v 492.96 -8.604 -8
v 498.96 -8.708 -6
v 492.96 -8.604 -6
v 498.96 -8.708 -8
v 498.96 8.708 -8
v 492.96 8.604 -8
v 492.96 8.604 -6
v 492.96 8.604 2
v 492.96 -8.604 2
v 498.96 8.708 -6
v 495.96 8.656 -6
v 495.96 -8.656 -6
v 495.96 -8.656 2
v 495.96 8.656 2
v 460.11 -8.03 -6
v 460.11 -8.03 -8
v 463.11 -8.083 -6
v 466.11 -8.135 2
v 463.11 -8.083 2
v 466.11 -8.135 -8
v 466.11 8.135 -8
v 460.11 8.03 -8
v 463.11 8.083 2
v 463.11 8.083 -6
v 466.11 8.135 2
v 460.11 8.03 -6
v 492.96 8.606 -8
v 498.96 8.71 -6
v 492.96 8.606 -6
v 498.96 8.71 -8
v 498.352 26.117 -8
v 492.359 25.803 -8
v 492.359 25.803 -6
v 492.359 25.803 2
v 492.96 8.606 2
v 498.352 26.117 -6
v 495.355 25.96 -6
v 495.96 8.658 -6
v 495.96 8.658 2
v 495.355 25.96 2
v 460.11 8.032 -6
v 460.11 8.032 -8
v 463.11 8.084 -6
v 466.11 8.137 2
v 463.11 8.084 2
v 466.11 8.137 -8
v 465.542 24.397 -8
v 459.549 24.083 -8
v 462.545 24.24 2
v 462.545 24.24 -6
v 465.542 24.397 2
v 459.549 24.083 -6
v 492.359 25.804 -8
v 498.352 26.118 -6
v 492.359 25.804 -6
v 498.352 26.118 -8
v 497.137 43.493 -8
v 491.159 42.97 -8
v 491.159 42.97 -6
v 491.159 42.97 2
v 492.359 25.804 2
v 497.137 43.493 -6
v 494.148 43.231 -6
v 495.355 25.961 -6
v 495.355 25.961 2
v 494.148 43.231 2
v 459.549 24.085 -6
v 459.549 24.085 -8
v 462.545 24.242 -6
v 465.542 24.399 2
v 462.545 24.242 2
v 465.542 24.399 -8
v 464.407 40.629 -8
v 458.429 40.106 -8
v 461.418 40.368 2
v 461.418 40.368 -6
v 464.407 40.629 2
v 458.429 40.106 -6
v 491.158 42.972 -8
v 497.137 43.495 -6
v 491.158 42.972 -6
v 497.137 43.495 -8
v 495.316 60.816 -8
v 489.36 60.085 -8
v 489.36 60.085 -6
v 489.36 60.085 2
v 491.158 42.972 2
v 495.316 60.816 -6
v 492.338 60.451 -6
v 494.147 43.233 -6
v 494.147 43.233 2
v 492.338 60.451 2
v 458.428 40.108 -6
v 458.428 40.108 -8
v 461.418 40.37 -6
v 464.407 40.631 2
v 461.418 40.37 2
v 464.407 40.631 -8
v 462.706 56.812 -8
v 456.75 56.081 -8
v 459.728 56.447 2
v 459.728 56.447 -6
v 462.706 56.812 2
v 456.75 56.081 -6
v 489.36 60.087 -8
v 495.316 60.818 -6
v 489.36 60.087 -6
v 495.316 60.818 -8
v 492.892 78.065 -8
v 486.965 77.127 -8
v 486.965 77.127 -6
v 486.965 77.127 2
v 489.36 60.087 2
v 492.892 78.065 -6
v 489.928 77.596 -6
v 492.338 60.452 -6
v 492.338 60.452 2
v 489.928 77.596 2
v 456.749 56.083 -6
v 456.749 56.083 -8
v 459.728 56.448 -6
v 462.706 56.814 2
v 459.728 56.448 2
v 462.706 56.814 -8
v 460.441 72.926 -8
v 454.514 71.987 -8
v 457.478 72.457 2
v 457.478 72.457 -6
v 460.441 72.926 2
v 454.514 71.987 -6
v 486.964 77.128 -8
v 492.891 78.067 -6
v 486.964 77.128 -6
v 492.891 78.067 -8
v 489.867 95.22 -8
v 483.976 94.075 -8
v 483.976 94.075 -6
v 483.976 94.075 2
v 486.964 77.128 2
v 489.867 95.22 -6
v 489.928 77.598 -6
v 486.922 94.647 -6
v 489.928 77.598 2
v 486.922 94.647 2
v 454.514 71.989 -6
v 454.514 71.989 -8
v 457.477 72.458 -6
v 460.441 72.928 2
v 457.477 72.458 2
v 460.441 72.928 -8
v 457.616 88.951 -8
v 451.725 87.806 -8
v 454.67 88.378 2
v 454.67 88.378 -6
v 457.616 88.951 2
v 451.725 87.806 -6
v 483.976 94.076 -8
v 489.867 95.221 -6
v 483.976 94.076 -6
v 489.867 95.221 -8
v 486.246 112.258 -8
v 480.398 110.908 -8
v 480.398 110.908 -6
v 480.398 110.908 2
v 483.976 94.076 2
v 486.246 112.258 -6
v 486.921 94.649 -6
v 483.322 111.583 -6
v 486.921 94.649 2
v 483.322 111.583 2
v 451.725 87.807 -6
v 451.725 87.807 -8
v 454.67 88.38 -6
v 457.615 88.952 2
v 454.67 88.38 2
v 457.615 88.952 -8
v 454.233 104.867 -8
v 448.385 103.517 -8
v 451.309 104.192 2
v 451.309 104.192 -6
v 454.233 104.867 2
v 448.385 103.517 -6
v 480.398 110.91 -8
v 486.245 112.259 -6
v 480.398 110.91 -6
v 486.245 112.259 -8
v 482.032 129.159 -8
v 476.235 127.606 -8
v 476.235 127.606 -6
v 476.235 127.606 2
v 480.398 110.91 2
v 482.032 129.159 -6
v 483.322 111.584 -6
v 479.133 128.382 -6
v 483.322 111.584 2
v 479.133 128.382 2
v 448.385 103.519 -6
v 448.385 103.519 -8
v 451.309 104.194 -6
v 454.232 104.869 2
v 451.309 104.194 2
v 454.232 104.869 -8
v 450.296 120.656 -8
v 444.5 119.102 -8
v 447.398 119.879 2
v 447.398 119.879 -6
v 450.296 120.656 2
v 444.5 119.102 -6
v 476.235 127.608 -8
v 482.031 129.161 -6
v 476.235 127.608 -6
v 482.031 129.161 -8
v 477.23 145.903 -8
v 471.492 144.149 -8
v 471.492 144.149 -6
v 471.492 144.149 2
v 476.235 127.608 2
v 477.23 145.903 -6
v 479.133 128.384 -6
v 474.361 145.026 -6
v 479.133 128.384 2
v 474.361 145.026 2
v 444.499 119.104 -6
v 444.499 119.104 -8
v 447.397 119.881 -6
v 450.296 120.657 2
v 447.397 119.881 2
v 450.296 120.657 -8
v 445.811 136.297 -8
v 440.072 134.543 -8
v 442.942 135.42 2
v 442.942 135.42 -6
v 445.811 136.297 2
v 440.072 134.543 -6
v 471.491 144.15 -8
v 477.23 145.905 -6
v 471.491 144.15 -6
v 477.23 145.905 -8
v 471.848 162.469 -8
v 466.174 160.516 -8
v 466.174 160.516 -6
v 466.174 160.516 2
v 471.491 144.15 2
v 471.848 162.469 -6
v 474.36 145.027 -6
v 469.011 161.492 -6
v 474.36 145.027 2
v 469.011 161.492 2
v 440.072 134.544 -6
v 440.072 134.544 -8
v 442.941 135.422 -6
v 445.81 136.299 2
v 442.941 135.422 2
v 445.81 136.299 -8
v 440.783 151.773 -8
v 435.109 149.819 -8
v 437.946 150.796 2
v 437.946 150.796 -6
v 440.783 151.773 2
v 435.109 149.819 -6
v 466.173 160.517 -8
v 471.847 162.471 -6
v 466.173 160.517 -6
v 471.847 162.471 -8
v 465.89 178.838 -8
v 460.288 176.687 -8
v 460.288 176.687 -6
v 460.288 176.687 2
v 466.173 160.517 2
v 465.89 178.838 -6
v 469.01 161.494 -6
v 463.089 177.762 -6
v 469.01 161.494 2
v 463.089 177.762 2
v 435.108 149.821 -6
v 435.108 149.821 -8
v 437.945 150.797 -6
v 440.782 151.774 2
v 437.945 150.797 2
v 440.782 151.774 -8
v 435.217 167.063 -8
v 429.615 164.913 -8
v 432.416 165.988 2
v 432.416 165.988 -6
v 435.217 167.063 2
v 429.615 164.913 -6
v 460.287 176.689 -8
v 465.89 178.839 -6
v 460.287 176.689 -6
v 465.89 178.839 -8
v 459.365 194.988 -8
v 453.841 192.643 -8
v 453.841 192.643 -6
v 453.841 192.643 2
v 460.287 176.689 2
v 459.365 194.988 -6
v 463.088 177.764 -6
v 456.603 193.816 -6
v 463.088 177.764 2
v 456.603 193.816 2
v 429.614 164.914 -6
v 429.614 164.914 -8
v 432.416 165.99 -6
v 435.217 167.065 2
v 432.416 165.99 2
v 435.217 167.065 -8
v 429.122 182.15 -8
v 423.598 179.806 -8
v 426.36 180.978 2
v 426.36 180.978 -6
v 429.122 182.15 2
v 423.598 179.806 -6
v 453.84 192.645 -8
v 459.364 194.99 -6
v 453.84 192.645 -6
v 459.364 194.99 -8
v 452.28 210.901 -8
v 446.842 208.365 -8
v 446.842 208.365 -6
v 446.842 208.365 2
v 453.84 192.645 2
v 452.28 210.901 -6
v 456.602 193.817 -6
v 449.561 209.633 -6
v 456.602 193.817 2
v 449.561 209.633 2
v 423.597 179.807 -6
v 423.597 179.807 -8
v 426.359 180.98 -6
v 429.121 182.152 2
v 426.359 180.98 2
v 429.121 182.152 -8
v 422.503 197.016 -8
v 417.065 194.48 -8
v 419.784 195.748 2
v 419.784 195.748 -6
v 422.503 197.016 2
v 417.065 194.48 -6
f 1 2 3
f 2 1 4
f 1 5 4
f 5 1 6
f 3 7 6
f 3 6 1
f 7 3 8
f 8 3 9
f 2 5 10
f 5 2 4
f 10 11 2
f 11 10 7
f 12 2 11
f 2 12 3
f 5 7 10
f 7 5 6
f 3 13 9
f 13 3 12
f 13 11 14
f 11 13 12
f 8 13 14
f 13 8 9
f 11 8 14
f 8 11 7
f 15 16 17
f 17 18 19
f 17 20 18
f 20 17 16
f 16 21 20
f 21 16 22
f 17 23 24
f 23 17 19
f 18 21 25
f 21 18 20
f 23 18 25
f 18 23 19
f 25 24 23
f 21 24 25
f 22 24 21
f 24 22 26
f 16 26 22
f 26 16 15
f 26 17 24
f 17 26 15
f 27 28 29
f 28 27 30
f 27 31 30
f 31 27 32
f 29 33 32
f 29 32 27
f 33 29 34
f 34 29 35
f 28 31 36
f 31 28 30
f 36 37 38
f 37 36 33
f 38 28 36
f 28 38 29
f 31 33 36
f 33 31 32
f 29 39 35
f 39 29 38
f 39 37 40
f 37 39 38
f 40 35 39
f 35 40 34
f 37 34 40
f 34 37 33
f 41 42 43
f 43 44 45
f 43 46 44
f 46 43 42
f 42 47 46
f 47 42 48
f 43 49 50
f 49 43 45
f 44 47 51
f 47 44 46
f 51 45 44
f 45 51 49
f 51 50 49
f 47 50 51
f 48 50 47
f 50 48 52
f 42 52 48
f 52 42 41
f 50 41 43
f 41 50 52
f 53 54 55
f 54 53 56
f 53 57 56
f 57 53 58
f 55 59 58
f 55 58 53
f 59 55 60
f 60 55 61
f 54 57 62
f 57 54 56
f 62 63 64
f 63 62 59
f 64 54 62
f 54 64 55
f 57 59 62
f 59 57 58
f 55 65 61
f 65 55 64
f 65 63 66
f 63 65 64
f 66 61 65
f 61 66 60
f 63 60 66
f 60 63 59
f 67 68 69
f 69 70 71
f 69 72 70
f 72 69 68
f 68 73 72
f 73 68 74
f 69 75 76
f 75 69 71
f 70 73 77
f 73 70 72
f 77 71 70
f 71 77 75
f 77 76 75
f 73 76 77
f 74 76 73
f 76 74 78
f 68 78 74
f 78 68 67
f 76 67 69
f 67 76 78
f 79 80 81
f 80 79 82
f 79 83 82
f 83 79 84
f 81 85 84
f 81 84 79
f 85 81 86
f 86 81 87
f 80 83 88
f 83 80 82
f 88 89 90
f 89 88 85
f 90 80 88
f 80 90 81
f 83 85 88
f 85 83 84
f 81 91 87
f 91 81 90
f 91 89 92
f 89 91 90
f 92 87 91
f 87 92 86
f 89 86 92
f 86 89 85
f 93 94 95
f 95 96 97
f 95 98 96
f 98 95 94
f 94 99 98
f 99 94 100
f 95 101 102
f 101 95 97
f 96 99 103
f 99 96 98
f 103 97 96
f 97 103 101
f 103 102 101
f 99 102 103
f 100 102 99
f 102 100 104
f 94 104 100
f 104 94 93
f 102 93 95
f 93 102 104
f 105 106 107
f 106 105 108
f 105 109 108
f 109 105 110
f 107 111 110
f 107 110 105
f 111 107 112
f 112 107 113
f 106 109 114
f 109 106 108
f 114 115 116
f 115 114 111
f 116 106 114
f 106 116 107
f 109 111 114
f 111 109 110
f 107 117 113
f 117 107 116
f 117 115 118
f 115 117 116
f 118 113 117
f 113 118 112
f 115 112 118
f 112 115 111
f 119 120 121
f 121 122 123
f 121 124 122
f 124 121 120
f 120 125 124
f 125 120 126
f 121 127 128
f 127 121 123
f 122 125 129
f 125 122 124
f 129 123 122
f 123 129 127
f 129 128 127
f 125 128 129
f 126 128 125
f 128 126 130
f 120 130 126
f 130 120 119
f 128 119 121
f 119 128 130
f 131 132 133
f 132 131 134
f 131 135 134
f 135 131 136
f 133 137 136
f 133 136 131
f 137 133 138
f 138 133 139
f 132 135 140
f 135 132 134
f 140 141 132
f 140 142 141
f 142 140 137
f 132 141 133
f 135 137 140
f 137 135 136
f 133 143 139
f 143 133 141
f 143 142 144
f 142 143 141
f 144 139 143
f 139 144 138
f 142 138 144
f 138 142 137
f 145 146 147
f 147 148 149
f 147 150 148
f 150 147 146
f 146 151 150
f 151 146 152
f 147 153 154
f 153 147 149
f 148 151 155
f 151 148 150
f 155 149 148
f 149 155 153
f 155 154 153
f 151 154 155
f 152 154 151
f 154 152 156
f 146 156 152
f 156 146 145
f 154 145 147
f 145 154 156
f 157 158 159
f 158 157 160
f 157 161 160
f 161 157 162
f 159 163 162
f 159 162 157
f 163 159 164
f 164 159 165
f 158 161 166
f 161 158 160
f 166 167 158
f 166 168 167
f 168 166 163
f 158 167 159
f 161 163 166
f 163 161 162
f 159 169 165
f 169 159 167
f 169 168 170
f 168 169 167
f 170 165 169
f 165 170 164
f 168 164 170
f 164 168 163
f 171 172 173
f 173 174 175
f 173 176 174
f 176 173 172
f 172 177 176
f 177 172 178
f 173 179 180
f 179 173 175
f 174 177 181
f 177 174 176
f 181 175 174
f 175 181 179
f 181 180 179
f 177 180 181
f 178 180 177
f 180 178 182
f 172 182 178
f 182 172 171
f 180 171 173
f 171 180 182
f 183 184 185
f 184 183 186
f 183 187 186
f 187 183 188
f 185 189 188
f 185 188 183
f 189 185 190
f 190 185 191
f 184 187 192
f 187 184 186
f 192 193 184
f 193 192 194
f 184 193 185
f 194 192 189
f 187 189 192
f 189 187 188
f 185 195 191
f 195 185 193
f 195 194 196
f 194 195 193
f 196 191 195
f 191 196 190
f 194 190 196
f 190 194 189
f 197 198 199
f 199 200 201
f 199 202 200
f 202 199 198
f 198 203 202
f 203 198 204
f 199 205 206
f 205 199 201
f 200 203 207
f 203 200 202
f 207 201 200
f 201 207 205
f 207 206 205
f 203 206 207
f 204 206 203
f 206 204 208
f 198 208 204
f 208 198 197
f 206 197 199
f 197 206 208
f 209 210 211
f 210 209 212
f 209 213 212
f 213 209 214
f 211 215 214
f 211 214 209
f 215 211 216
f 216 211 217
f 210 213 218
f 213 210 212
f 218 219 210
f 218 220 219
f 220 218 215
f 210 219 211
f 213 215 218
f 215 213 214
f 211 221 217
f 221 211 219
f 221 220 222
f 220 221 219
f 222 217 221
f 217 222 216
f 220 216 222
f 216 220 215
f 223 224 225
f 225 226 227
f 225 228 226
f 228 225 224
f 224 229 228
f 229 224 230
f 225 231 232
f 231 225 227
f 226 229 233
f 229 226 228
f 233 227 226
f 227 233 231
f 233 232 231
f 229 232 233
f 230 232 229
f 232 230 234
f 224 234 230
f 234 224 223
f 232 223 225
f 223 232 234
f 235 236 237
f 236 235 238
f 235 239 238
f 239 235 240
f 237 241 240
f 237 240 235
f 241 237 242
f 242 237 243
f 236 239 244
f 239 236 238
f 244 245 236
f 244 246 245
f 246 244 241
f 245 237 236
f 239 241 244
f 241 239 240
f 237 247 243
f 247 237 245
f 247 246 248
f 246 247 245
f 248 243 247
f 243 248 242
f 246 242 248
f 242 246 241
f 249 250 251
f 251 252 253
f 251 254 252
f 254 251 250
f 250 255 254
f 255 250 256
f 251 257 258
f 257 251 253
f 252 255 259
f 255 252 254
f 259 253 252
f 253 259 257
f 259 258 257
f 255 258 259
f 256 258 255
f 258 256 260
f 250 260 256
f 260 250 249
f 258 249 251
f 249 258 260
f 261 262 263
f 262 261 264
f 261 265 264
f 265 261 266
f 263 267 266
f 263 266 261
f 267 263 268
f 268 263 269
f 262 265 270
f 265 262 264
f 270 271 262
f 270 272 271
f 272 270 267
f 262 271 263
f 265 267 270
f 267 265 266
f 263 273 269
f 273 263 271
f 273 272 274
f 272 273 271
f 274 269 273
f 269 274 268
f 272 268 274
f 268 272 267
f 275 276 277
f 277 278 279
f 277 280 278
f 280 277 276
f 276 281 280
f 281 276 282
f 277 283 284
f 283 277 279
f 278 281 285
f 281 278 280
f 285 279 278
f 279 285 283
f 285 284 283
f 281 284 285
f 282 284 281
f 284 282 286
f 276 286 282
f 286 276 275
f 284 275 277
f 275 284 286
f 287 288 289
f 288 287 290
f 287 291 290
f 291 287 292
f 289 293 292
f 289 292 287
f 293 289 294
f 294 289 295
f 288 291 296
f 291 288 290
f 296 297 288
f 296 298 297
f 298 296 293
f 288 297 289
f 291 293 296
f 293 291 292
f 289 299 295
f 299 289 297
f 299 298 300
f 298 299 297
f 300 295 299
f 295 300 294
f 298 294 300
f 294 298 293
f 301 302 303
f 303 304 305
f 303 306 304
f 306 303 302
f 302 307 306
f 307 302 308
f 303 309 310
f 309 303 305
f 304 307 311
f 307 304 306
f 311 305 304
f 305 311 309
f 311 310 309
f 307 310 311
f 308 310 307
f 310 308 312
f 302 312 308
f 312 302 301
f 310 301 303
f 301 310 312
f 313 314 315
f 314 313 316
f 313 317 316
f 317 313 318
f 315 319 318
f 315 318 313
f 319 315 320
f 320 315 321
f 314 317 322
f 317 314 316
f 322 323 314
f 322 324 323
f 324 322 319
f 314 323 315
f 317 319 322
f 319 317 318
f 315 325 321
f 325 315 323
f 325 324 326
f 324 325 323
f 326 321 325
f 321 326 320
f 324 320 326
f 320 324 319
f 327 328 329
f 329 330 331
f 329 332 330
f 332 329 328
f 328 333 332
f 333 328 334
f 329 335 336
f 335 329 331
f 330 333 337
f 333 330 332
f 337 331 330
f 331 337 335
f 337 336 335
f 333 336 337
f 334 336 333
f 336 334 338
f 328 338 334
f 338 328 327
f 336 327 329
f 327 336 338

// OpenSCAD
$led_count = 180;
$leds_to_render = 13;
$led_strip_width = 9.85;
$led_length = 16.567;
$tray_height = 5.0;
$slab_height = 2.0;
$led_height = 3.5;
$led_wall = 1.5;
$cable_floor =2;

$render_slab = false;
$render_tray = false;
$render_split = false;
$render_mount = true;



//constants
pi = 3.14159265358;
two_pi = pi*2;


// LED strip
angle_per_led = 360/$led_count;
segment_to_length = (1/$led_count)*two_pi;
led_inner_circumference = $led_count * $led_length;
led_inner_radius = led_inner_circumference / two_pi;
led_outer_radius = led_inner_radius + $led_strip_width;

// widths relative to inner LED 

module segment(radius_offset, width, depth){
    radius = led_inner_radius + radius_offset;
    inner = (radius * segment_to_length)/2;
    outer = ((radius+width) * segment_to_length)/2;
    
    linear_extrude(height=depth, center=false) {
        polygon([[-inner,radius_offset], [inner,radius_offset], [outer,radius_offset+width], [-outer,radius_offset+width]]);
    };
}

module cable(radius_offset, width, depth, cable_dia){
    c = 0.1;
    radius = led_inner_radius + (radius_offset/2);
    length = 2*radius * segment_to_length;
    cable_r = cable_dia/2;
       
    difference(){
        segment(radius_offset, width, depth);
        
        hull(){
          translate([0, radius_offset+width/2, $tray_height-(cable_dia*0.7)])
            rotate([0,90,0])
              cylinder(h=length, r1=cable_r, r2=cable_r, center=true);
        
          translate([0, radius_offset+width/2, 2*$tray_height])
            rotate([0,90,0])
              cylinder(h=length, r1=cable_r, r2=cable_r, center=true);
        }
    }
}

module make_slab(inner_offset, outer_offset, h){
    
    inner_edge_radius = led_inner_radius + inner_offset;
    outer_edge_radius =  led_inner_radius + outer_offset;
    
    depth = outer_offset-inner_offset;
    
    inner_w = (inner_edge_radius * segment_to_length)/2;
    outer_w = (outer_edge_radius * segment_to_length)/2;
    
    centre_y = ($led_strip_width/2);
    centre_x = 0;
   
    
    color("yellow")
    linear_extrude(height=h, center=false){
            polygon([
              [-inner_w, inner_offset], 
              [ inner_w, inner_offset], 
              [ outer_w, outer_offset],
              [-outer_w, outer_offset]]);
      };
}

module make_splitter()
{
    slab_h = 5;
    drop = 1.8;
    divide_h = slab_h + drop;

    inner_w = (led_inner_radius * segment_to_length)/2;
    outer_w = (led_outer_radius * segment_to_length)/2;
    inner_wall_width = 1;
    
    light_splitter_offset = 0.00;
    splitter_depth = $led_strip_width - light_splitter_offset;


    // Inner slab and shamfer
    difference(){
        make_slab(-8.5, light_splitter_offset, slab_h);
        
        rotate([40,0,0])
        linear_extrude(height=slab_h*2, center=false)
        polygon([
            [-inner_w, 0],
            [ inner_w-inner_wall_width, 0],
            [ inner_w-inner_wall_width, $led_strip_width],
            [-inner_w, $led_strip_width]
        ]);
    }


    // outer slab and shamfer
    difference(){
        make_slab(splitter_depth, $led_strip_width + 8.5, slab_h);
    
        translate([0,$led_strip_width,0])
        mirror([0,1,1])
        rotate([130,0,0])
        linear_extrude(height=slab_h*2, center=false)
        polygon([
            [-outer_w-0.1, 0],
            [ outer_w-inner_wall_width, 0],
            [ outer_w-inner_wall_width, $led_strip_width],
            [-outer_w, $led_strip_width]
        ]);
    }
  
    /*
    color("black")
    translate([0,0,slab_h-divide_h])
    linear_extrude(height=divide_h, center=false)
        polygon([
            [-inner_w, light_splitter_offset],
            [-inner_w+inner_wall_width, light_splitter_offset],
            [-outer_w+inner_wall_width, splitter_depth],
            [-outer_w, splitter_depth]
        ]);
    */
    
    color("magenta")
    difference()
    {
        translate([0,0,slab_h-divide_h])    
        linear_extrude(height=divide_h, center=false)
            polygon([
                [inner_w, light_splitter_offset],
                [inner_w-inner_wall_width, light_splitter_offset],
                [outer_w-inner_wall_width, splitter_depth],
                [outer_w, splitter_depth]
            ]);

        // Notch of inner edge of drop
        translate([inner_w-.5,0,-drop])
            rotate([0,-90,0])
                linear_extrude(height=drop, center=true)
                    polygon([
                    [0, light_splitter_offset],
                    [drop, light_splitter_offset],
                    [0, light_splitter_offset+1]
                ]);
        
        // Notch of outer edge of drop
        translate([inner_w,$led_strip_width,-drop])
            rotate([0,-90,180])
                linear_extrude(height=drop, center=true)
                    polygon([
                    [0, light_splitter_offset],
                    [drop, light_splitter_offset],
                    [0, light_splitter_offset+1]
                ]);
    }         
    
    
}

module make_segment(){
    color("red")
        segment(0, $led_strip_width, $tray_height-$led_height) ;
    
    color("blue"){
        cable(-8.5, 4.0, $tray_height, 2);
        cable(-5.0, 5.0, $tray_height, 3);
        cable($led_strip_width, 5.0, $tray_height, 3);
        cable($led_strip_width+4.5, 4.0, $tray_height, 2);
    }
    
}


module debug(){
    echo("LED count", $led_count);
    echo("LED length", $led_length);
    echo("LED inner C", led_inner_circumference);
    echo("LED inner R", led_inner_radius);

    echo("Angle/LED", angle_per_led);
    echo("Segment to Led", segment_to_length);
    
}

debug();






for(i=[0:$leds_to_render-1]){
    angle1 =  i * angle_per_led;
    
    x1 = led_inner_radius * cos(angle1);
    y1 = led_inner_radius * sin(angle1);
    
    if($render_tray){
        translate([x1,y1,0]){
            rotate([0,0,270+angle1]){
                make_segment();
            }
        }
    }

    // core strip   
   if($render_slab){ 
       color("red")
       translate([x1,y1,-8]){
           rotate([0,0,270+angle1]){
                difference(){
                    make_slab(-8.5, $led_strip_width + 8.5, $slab_height);
                }
           }
       }
    }
    
    if($render_mount){
      translate([x1,y1,-8]){
        rotate([0,0,270+angle1]){
          make_slab($led_strip_width+8.5, $led_strip_width+8.5+6, 2);
          make_slab($led_strip_width+8.5, $led_strip_width+8.5+3, 10);
            
          make_slab(-11.5, -8.5,  10);
          make_slab(-14.5, -8.5,  2);
        }
      }
    }
    
    // beam splitter
    if($render_split){
        translate([x1,y1,5]){
            rotate([0,0,270+angle1]){
                make_splitter();
            }
        }
    }
}    
